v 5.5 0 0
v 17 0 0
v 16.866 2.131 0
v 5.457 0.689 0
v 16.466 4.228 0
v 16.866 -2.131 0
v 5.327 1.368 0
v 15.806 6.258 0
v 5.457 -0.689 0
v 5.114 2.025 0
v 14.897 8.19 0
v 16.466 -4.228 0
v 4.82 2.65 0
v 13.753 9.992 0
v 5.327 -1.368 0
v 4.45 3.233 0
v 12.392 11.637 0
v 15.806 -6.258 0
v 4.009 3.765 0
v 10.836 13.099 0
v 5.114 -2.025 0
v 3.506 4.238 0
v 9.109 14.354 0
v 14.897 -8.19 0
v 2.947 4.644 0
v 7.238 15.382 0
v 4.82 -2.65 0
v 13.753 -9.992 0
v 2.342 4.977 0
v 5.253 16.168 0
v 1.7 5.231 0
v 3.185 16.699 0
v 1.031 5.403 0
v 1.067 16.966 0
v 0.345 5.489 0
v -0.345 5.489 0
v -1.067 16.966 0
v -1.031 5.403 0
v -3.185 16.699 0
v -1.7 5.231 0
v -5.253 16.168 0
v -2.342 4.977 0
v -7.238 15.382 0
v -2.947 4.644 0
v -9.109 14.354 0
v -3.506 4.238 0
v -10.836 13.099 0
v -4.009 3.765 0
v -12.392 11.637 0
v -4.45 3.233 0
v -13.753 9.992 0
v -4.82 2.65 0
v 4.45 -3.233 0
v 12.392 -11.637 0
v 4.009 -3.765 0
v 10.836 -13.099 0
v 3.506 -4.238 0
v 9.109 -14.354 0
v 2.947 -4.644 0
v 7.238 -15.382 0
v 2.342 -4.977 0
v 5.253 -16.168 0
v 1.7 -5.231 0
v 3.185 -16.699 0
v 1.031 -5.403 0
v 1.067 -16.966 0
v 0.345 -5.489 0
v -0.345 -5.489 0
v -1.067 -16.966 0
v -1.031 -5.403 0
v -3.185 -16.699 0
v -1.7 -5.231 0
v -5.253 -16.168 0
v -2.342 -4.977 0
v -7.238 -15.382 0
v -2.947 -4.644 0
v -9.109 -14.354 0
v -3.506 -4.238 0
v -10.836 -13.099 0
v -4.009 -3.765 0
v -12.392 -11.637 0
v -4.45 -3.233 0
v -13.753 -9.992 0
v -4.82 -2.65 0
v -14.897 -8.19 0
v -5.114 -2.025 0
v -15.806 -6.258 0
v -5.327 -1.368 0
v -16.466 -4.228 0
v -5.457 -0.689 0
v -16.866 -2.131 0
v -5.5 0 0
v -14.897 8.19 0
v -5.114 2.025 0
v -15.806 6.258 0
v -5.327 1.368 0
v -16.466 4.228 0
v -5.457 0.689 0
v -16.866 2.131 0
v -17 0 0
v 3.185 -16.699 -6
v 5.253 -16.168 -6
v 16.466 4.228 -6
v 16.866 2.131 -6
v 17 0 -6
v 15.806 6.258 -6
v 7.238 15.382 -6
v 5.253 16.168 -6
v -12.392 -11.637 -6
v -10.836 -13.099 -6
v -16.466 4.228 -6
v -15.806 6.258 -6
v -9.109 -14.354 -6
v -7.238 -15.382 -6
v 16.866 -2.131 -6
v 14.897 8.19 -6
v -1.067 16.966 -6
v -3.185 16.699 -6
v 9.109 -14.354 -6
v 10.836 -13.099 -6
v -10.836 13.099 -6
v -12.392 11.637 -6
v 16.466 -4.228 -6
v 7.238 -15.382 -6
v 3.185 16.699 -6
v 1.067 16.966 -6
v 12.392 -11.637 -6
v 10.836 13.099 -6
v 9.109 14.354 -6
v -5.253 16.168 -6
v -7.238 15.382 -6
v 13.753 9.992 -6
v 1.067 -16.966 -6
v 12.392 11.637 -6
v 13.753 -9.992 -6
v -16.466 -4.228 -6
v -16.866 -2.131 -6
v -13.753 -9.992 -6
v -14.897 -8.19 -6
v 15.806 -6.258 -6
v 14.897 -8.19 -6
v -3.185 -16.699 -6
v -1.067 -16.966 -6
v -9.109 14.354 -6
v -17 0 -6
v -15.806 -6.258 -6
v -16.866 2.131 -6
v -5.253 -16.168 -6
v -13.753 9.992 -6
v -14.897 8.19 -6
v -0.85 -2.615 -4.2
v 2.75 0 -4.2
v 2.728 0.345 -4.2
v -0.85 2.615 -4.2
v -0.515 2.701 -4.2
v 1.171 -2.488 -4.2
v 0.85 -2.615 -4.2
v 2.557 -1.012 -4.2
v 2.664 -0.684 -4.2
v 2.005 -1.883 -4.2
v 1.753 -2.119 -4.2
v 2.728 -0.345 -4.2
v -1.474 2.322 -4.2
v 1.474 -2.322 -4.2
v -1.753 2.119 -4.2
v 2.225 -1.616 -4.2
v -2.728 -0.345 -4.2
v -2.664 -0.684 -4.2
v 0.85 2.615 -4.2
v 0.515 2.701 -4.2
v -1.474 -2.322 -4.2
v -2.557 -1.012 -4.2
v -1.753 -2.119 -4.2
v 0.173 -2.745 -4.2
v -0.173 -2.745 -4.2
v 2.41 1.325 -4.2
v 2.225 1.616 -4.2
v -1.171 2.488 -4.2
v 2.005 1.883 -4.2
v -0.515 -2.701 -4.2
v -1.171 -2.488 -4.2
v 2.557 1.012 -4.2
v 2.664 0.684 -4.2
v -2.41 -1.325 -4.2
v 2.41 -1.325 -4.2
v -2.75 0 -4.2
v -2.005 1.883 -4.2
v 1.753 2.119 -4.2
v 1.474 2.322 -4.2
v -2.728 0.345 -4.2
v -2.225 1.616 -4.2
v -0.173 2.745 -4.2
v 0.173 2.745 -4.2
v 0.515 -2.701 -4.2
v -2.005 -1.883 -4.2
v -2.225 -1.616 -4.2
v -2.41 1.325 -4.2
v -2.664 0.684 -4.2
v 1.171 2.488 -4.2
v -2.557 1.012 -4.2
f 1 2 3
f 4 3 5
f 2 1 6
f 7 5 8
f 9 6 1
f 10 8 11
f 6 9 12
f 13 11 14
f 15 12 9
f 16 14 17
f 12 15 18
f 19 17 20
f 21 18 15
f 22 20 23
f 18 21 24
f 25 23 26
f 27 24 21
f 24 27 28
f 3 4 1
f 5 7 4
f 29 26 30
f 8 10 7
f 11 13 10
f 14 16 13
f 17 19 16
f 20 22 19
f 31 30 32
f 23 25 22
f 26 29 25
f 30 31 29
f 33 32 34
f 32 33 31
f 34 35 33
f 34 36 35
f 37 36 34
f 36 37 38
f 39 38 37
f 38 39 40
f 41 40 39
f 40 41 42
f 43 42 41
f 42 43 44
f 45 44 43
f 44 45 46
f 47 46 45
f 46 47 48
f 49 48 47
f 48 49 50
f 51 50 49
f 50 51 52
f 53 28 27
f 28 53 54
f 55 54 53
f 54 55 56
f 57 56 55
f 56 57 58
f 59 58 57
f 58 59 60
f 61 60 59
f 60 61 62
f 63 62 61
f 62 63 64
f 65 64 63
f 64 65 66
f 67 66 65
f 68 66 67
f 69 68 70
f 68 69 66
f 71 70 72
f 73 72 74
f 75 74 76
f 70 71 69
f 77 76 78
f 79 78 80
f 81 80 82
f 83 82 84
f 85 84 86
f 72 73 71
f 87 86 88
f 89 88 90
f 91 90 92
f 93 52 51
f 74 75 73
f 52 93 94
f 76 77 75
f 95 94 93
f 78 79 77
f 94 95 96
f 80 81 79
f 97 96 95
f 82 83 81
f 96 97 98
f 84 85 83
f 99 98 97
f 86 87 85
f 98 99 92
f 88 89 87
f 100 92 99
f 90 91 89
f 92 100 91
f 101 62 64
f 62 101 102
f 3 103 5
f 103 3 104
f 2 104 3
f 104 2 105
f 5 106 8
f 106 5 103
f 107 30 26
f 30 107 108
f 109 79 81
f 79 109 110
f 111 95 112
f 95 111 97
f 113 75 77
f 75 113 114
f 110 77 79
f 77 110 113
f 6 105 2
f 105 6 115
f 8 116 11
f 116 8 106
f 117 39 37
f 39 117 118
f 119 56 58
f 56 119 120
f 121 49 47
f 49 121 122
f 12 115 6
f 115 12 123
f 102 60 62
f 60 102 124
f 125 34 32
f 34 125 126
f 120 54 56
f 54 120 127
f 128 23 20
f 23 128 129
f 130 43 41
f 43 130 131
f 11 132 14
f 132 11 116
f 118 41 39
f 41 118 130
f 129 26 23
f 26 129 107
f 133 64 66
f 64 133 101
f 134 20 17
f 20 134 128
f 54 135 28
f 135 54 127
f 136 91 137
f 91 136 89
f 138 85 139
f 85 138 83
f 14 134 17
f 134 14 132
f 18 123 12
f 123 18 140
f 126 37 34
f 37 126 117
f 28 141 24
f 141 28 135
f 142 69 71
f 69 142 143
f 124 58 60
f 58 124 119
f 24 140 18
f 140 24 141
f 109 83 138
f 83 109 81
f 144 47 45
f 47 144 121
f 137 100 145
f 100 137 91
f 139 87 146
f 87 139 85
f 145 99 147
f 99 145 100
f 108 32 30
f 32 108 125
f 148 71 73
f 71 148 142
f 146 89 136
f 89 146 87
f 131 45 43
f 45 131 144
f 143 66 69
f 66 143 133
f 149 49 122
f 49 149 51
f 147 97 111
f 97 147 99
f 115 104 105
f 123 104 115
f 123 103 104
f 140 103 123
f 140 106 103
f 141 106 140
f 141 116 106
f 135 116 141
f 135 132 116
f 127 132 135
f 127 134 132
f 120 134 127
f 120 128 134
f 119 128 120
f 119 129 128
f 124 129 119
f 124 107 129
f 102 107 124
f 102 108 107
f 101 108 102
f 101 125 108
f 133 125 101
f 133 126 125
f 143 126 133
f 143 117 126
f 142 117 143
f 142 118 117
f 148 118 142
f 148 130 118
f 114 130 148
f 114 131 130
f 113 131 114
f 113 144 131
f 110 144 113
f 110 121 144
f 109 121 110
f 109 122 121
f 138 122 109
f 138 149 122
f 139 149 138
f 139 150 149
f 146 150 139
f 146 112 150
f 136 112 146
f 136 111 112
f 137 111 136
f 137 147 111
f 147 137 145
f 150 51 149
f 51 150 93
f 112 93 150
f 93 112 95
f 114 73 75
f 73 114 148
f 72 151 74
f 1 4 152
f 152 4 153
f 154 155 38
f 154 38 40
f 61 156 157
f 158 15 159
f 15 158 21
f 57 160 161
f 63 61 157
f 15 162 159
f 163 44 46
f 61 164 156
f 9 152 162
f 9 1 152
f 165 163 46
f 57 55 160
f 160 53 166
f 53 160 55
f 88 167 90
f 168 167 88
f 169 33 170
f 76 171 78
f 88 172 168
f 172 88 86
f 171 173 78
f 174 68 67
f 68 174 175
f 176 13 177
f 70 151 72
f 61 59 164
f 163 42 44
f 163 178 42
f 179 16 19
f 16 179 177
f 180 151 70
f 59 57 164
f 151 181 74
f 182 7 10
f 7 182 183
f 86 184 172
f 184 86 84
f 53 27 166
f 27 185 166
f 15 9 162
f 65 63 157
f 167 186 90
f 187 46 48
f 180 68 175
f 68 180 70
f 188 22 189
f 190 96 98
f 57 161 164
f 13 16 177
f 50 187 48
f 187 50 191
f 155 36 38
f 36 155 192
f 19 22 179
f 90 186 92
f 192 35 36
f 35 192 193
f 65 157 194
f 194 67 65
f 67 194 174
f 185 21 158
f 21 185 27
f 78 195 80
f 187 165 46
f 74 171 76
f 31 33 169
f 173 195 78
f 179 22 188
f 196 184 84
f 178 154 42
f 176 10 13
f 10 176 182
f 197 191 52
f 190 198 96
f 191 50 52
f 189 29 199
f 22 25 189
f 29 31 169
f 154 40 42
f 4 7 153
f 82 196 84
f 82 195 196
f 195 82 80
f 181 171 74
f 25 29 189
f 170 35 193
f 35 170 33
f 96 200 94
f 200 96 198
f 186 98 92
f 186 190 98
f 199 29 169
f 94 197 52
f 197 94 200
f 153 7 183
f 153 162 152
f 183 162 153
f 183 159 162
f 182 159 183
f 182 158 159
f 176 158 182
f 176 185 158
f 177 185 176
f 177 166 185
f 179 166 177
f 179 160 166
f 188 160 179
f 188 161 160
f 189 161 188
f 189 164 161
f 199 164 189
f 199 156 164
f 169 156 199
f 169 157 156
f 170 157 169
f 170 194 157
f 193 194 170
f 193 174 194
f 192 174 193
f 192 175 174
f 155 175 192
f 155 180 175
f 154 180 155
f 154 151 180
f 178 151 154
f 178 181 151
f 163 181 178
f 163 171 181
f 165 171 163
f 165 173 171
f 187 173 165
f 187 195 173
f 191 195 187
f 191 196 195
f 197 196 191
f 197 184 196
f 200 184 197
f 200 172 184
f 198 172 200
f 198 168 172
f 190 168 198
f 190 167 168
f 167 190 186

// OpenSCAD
$fn = 50;


difference() {
	union() {
		translate(v = [0, 0, -3.0000000000]) {
			cylinder(h = 3, r = 7.0000000000);
		}
		translate(v = [0, 0, -6.0000000000]) {
			cylinder(h = 6, r = 17.0000000000);
		}
	}
	union() {
		translate(v = [0, 0, 0]) {
			rotate(a = [0, 0, 0]) {
				difference() {
					union() {
						#translate(v = [0, 0, -3.0000000000]) {
							cylinder(h = 3, r = 2.2500000000);
						}
						#translate(v = [0, 0, -4.2000000000]) {
							cylinder(h = 4.2000000000, r = 7.0000000000, r1 = 2.7500000000, r2 = 5.5000000000);
						}
						#translate(v = [0, 0, -3.0000000000]) {
							cylinder(h = 3, r = 2.7500000000);
						}
						#translate(v = [0, 0, -3.0000000000]) {
							cylinder(h = 3, r = 2.2500000000);
						}
					}
					union();
				}
			}
		}
	}
}
